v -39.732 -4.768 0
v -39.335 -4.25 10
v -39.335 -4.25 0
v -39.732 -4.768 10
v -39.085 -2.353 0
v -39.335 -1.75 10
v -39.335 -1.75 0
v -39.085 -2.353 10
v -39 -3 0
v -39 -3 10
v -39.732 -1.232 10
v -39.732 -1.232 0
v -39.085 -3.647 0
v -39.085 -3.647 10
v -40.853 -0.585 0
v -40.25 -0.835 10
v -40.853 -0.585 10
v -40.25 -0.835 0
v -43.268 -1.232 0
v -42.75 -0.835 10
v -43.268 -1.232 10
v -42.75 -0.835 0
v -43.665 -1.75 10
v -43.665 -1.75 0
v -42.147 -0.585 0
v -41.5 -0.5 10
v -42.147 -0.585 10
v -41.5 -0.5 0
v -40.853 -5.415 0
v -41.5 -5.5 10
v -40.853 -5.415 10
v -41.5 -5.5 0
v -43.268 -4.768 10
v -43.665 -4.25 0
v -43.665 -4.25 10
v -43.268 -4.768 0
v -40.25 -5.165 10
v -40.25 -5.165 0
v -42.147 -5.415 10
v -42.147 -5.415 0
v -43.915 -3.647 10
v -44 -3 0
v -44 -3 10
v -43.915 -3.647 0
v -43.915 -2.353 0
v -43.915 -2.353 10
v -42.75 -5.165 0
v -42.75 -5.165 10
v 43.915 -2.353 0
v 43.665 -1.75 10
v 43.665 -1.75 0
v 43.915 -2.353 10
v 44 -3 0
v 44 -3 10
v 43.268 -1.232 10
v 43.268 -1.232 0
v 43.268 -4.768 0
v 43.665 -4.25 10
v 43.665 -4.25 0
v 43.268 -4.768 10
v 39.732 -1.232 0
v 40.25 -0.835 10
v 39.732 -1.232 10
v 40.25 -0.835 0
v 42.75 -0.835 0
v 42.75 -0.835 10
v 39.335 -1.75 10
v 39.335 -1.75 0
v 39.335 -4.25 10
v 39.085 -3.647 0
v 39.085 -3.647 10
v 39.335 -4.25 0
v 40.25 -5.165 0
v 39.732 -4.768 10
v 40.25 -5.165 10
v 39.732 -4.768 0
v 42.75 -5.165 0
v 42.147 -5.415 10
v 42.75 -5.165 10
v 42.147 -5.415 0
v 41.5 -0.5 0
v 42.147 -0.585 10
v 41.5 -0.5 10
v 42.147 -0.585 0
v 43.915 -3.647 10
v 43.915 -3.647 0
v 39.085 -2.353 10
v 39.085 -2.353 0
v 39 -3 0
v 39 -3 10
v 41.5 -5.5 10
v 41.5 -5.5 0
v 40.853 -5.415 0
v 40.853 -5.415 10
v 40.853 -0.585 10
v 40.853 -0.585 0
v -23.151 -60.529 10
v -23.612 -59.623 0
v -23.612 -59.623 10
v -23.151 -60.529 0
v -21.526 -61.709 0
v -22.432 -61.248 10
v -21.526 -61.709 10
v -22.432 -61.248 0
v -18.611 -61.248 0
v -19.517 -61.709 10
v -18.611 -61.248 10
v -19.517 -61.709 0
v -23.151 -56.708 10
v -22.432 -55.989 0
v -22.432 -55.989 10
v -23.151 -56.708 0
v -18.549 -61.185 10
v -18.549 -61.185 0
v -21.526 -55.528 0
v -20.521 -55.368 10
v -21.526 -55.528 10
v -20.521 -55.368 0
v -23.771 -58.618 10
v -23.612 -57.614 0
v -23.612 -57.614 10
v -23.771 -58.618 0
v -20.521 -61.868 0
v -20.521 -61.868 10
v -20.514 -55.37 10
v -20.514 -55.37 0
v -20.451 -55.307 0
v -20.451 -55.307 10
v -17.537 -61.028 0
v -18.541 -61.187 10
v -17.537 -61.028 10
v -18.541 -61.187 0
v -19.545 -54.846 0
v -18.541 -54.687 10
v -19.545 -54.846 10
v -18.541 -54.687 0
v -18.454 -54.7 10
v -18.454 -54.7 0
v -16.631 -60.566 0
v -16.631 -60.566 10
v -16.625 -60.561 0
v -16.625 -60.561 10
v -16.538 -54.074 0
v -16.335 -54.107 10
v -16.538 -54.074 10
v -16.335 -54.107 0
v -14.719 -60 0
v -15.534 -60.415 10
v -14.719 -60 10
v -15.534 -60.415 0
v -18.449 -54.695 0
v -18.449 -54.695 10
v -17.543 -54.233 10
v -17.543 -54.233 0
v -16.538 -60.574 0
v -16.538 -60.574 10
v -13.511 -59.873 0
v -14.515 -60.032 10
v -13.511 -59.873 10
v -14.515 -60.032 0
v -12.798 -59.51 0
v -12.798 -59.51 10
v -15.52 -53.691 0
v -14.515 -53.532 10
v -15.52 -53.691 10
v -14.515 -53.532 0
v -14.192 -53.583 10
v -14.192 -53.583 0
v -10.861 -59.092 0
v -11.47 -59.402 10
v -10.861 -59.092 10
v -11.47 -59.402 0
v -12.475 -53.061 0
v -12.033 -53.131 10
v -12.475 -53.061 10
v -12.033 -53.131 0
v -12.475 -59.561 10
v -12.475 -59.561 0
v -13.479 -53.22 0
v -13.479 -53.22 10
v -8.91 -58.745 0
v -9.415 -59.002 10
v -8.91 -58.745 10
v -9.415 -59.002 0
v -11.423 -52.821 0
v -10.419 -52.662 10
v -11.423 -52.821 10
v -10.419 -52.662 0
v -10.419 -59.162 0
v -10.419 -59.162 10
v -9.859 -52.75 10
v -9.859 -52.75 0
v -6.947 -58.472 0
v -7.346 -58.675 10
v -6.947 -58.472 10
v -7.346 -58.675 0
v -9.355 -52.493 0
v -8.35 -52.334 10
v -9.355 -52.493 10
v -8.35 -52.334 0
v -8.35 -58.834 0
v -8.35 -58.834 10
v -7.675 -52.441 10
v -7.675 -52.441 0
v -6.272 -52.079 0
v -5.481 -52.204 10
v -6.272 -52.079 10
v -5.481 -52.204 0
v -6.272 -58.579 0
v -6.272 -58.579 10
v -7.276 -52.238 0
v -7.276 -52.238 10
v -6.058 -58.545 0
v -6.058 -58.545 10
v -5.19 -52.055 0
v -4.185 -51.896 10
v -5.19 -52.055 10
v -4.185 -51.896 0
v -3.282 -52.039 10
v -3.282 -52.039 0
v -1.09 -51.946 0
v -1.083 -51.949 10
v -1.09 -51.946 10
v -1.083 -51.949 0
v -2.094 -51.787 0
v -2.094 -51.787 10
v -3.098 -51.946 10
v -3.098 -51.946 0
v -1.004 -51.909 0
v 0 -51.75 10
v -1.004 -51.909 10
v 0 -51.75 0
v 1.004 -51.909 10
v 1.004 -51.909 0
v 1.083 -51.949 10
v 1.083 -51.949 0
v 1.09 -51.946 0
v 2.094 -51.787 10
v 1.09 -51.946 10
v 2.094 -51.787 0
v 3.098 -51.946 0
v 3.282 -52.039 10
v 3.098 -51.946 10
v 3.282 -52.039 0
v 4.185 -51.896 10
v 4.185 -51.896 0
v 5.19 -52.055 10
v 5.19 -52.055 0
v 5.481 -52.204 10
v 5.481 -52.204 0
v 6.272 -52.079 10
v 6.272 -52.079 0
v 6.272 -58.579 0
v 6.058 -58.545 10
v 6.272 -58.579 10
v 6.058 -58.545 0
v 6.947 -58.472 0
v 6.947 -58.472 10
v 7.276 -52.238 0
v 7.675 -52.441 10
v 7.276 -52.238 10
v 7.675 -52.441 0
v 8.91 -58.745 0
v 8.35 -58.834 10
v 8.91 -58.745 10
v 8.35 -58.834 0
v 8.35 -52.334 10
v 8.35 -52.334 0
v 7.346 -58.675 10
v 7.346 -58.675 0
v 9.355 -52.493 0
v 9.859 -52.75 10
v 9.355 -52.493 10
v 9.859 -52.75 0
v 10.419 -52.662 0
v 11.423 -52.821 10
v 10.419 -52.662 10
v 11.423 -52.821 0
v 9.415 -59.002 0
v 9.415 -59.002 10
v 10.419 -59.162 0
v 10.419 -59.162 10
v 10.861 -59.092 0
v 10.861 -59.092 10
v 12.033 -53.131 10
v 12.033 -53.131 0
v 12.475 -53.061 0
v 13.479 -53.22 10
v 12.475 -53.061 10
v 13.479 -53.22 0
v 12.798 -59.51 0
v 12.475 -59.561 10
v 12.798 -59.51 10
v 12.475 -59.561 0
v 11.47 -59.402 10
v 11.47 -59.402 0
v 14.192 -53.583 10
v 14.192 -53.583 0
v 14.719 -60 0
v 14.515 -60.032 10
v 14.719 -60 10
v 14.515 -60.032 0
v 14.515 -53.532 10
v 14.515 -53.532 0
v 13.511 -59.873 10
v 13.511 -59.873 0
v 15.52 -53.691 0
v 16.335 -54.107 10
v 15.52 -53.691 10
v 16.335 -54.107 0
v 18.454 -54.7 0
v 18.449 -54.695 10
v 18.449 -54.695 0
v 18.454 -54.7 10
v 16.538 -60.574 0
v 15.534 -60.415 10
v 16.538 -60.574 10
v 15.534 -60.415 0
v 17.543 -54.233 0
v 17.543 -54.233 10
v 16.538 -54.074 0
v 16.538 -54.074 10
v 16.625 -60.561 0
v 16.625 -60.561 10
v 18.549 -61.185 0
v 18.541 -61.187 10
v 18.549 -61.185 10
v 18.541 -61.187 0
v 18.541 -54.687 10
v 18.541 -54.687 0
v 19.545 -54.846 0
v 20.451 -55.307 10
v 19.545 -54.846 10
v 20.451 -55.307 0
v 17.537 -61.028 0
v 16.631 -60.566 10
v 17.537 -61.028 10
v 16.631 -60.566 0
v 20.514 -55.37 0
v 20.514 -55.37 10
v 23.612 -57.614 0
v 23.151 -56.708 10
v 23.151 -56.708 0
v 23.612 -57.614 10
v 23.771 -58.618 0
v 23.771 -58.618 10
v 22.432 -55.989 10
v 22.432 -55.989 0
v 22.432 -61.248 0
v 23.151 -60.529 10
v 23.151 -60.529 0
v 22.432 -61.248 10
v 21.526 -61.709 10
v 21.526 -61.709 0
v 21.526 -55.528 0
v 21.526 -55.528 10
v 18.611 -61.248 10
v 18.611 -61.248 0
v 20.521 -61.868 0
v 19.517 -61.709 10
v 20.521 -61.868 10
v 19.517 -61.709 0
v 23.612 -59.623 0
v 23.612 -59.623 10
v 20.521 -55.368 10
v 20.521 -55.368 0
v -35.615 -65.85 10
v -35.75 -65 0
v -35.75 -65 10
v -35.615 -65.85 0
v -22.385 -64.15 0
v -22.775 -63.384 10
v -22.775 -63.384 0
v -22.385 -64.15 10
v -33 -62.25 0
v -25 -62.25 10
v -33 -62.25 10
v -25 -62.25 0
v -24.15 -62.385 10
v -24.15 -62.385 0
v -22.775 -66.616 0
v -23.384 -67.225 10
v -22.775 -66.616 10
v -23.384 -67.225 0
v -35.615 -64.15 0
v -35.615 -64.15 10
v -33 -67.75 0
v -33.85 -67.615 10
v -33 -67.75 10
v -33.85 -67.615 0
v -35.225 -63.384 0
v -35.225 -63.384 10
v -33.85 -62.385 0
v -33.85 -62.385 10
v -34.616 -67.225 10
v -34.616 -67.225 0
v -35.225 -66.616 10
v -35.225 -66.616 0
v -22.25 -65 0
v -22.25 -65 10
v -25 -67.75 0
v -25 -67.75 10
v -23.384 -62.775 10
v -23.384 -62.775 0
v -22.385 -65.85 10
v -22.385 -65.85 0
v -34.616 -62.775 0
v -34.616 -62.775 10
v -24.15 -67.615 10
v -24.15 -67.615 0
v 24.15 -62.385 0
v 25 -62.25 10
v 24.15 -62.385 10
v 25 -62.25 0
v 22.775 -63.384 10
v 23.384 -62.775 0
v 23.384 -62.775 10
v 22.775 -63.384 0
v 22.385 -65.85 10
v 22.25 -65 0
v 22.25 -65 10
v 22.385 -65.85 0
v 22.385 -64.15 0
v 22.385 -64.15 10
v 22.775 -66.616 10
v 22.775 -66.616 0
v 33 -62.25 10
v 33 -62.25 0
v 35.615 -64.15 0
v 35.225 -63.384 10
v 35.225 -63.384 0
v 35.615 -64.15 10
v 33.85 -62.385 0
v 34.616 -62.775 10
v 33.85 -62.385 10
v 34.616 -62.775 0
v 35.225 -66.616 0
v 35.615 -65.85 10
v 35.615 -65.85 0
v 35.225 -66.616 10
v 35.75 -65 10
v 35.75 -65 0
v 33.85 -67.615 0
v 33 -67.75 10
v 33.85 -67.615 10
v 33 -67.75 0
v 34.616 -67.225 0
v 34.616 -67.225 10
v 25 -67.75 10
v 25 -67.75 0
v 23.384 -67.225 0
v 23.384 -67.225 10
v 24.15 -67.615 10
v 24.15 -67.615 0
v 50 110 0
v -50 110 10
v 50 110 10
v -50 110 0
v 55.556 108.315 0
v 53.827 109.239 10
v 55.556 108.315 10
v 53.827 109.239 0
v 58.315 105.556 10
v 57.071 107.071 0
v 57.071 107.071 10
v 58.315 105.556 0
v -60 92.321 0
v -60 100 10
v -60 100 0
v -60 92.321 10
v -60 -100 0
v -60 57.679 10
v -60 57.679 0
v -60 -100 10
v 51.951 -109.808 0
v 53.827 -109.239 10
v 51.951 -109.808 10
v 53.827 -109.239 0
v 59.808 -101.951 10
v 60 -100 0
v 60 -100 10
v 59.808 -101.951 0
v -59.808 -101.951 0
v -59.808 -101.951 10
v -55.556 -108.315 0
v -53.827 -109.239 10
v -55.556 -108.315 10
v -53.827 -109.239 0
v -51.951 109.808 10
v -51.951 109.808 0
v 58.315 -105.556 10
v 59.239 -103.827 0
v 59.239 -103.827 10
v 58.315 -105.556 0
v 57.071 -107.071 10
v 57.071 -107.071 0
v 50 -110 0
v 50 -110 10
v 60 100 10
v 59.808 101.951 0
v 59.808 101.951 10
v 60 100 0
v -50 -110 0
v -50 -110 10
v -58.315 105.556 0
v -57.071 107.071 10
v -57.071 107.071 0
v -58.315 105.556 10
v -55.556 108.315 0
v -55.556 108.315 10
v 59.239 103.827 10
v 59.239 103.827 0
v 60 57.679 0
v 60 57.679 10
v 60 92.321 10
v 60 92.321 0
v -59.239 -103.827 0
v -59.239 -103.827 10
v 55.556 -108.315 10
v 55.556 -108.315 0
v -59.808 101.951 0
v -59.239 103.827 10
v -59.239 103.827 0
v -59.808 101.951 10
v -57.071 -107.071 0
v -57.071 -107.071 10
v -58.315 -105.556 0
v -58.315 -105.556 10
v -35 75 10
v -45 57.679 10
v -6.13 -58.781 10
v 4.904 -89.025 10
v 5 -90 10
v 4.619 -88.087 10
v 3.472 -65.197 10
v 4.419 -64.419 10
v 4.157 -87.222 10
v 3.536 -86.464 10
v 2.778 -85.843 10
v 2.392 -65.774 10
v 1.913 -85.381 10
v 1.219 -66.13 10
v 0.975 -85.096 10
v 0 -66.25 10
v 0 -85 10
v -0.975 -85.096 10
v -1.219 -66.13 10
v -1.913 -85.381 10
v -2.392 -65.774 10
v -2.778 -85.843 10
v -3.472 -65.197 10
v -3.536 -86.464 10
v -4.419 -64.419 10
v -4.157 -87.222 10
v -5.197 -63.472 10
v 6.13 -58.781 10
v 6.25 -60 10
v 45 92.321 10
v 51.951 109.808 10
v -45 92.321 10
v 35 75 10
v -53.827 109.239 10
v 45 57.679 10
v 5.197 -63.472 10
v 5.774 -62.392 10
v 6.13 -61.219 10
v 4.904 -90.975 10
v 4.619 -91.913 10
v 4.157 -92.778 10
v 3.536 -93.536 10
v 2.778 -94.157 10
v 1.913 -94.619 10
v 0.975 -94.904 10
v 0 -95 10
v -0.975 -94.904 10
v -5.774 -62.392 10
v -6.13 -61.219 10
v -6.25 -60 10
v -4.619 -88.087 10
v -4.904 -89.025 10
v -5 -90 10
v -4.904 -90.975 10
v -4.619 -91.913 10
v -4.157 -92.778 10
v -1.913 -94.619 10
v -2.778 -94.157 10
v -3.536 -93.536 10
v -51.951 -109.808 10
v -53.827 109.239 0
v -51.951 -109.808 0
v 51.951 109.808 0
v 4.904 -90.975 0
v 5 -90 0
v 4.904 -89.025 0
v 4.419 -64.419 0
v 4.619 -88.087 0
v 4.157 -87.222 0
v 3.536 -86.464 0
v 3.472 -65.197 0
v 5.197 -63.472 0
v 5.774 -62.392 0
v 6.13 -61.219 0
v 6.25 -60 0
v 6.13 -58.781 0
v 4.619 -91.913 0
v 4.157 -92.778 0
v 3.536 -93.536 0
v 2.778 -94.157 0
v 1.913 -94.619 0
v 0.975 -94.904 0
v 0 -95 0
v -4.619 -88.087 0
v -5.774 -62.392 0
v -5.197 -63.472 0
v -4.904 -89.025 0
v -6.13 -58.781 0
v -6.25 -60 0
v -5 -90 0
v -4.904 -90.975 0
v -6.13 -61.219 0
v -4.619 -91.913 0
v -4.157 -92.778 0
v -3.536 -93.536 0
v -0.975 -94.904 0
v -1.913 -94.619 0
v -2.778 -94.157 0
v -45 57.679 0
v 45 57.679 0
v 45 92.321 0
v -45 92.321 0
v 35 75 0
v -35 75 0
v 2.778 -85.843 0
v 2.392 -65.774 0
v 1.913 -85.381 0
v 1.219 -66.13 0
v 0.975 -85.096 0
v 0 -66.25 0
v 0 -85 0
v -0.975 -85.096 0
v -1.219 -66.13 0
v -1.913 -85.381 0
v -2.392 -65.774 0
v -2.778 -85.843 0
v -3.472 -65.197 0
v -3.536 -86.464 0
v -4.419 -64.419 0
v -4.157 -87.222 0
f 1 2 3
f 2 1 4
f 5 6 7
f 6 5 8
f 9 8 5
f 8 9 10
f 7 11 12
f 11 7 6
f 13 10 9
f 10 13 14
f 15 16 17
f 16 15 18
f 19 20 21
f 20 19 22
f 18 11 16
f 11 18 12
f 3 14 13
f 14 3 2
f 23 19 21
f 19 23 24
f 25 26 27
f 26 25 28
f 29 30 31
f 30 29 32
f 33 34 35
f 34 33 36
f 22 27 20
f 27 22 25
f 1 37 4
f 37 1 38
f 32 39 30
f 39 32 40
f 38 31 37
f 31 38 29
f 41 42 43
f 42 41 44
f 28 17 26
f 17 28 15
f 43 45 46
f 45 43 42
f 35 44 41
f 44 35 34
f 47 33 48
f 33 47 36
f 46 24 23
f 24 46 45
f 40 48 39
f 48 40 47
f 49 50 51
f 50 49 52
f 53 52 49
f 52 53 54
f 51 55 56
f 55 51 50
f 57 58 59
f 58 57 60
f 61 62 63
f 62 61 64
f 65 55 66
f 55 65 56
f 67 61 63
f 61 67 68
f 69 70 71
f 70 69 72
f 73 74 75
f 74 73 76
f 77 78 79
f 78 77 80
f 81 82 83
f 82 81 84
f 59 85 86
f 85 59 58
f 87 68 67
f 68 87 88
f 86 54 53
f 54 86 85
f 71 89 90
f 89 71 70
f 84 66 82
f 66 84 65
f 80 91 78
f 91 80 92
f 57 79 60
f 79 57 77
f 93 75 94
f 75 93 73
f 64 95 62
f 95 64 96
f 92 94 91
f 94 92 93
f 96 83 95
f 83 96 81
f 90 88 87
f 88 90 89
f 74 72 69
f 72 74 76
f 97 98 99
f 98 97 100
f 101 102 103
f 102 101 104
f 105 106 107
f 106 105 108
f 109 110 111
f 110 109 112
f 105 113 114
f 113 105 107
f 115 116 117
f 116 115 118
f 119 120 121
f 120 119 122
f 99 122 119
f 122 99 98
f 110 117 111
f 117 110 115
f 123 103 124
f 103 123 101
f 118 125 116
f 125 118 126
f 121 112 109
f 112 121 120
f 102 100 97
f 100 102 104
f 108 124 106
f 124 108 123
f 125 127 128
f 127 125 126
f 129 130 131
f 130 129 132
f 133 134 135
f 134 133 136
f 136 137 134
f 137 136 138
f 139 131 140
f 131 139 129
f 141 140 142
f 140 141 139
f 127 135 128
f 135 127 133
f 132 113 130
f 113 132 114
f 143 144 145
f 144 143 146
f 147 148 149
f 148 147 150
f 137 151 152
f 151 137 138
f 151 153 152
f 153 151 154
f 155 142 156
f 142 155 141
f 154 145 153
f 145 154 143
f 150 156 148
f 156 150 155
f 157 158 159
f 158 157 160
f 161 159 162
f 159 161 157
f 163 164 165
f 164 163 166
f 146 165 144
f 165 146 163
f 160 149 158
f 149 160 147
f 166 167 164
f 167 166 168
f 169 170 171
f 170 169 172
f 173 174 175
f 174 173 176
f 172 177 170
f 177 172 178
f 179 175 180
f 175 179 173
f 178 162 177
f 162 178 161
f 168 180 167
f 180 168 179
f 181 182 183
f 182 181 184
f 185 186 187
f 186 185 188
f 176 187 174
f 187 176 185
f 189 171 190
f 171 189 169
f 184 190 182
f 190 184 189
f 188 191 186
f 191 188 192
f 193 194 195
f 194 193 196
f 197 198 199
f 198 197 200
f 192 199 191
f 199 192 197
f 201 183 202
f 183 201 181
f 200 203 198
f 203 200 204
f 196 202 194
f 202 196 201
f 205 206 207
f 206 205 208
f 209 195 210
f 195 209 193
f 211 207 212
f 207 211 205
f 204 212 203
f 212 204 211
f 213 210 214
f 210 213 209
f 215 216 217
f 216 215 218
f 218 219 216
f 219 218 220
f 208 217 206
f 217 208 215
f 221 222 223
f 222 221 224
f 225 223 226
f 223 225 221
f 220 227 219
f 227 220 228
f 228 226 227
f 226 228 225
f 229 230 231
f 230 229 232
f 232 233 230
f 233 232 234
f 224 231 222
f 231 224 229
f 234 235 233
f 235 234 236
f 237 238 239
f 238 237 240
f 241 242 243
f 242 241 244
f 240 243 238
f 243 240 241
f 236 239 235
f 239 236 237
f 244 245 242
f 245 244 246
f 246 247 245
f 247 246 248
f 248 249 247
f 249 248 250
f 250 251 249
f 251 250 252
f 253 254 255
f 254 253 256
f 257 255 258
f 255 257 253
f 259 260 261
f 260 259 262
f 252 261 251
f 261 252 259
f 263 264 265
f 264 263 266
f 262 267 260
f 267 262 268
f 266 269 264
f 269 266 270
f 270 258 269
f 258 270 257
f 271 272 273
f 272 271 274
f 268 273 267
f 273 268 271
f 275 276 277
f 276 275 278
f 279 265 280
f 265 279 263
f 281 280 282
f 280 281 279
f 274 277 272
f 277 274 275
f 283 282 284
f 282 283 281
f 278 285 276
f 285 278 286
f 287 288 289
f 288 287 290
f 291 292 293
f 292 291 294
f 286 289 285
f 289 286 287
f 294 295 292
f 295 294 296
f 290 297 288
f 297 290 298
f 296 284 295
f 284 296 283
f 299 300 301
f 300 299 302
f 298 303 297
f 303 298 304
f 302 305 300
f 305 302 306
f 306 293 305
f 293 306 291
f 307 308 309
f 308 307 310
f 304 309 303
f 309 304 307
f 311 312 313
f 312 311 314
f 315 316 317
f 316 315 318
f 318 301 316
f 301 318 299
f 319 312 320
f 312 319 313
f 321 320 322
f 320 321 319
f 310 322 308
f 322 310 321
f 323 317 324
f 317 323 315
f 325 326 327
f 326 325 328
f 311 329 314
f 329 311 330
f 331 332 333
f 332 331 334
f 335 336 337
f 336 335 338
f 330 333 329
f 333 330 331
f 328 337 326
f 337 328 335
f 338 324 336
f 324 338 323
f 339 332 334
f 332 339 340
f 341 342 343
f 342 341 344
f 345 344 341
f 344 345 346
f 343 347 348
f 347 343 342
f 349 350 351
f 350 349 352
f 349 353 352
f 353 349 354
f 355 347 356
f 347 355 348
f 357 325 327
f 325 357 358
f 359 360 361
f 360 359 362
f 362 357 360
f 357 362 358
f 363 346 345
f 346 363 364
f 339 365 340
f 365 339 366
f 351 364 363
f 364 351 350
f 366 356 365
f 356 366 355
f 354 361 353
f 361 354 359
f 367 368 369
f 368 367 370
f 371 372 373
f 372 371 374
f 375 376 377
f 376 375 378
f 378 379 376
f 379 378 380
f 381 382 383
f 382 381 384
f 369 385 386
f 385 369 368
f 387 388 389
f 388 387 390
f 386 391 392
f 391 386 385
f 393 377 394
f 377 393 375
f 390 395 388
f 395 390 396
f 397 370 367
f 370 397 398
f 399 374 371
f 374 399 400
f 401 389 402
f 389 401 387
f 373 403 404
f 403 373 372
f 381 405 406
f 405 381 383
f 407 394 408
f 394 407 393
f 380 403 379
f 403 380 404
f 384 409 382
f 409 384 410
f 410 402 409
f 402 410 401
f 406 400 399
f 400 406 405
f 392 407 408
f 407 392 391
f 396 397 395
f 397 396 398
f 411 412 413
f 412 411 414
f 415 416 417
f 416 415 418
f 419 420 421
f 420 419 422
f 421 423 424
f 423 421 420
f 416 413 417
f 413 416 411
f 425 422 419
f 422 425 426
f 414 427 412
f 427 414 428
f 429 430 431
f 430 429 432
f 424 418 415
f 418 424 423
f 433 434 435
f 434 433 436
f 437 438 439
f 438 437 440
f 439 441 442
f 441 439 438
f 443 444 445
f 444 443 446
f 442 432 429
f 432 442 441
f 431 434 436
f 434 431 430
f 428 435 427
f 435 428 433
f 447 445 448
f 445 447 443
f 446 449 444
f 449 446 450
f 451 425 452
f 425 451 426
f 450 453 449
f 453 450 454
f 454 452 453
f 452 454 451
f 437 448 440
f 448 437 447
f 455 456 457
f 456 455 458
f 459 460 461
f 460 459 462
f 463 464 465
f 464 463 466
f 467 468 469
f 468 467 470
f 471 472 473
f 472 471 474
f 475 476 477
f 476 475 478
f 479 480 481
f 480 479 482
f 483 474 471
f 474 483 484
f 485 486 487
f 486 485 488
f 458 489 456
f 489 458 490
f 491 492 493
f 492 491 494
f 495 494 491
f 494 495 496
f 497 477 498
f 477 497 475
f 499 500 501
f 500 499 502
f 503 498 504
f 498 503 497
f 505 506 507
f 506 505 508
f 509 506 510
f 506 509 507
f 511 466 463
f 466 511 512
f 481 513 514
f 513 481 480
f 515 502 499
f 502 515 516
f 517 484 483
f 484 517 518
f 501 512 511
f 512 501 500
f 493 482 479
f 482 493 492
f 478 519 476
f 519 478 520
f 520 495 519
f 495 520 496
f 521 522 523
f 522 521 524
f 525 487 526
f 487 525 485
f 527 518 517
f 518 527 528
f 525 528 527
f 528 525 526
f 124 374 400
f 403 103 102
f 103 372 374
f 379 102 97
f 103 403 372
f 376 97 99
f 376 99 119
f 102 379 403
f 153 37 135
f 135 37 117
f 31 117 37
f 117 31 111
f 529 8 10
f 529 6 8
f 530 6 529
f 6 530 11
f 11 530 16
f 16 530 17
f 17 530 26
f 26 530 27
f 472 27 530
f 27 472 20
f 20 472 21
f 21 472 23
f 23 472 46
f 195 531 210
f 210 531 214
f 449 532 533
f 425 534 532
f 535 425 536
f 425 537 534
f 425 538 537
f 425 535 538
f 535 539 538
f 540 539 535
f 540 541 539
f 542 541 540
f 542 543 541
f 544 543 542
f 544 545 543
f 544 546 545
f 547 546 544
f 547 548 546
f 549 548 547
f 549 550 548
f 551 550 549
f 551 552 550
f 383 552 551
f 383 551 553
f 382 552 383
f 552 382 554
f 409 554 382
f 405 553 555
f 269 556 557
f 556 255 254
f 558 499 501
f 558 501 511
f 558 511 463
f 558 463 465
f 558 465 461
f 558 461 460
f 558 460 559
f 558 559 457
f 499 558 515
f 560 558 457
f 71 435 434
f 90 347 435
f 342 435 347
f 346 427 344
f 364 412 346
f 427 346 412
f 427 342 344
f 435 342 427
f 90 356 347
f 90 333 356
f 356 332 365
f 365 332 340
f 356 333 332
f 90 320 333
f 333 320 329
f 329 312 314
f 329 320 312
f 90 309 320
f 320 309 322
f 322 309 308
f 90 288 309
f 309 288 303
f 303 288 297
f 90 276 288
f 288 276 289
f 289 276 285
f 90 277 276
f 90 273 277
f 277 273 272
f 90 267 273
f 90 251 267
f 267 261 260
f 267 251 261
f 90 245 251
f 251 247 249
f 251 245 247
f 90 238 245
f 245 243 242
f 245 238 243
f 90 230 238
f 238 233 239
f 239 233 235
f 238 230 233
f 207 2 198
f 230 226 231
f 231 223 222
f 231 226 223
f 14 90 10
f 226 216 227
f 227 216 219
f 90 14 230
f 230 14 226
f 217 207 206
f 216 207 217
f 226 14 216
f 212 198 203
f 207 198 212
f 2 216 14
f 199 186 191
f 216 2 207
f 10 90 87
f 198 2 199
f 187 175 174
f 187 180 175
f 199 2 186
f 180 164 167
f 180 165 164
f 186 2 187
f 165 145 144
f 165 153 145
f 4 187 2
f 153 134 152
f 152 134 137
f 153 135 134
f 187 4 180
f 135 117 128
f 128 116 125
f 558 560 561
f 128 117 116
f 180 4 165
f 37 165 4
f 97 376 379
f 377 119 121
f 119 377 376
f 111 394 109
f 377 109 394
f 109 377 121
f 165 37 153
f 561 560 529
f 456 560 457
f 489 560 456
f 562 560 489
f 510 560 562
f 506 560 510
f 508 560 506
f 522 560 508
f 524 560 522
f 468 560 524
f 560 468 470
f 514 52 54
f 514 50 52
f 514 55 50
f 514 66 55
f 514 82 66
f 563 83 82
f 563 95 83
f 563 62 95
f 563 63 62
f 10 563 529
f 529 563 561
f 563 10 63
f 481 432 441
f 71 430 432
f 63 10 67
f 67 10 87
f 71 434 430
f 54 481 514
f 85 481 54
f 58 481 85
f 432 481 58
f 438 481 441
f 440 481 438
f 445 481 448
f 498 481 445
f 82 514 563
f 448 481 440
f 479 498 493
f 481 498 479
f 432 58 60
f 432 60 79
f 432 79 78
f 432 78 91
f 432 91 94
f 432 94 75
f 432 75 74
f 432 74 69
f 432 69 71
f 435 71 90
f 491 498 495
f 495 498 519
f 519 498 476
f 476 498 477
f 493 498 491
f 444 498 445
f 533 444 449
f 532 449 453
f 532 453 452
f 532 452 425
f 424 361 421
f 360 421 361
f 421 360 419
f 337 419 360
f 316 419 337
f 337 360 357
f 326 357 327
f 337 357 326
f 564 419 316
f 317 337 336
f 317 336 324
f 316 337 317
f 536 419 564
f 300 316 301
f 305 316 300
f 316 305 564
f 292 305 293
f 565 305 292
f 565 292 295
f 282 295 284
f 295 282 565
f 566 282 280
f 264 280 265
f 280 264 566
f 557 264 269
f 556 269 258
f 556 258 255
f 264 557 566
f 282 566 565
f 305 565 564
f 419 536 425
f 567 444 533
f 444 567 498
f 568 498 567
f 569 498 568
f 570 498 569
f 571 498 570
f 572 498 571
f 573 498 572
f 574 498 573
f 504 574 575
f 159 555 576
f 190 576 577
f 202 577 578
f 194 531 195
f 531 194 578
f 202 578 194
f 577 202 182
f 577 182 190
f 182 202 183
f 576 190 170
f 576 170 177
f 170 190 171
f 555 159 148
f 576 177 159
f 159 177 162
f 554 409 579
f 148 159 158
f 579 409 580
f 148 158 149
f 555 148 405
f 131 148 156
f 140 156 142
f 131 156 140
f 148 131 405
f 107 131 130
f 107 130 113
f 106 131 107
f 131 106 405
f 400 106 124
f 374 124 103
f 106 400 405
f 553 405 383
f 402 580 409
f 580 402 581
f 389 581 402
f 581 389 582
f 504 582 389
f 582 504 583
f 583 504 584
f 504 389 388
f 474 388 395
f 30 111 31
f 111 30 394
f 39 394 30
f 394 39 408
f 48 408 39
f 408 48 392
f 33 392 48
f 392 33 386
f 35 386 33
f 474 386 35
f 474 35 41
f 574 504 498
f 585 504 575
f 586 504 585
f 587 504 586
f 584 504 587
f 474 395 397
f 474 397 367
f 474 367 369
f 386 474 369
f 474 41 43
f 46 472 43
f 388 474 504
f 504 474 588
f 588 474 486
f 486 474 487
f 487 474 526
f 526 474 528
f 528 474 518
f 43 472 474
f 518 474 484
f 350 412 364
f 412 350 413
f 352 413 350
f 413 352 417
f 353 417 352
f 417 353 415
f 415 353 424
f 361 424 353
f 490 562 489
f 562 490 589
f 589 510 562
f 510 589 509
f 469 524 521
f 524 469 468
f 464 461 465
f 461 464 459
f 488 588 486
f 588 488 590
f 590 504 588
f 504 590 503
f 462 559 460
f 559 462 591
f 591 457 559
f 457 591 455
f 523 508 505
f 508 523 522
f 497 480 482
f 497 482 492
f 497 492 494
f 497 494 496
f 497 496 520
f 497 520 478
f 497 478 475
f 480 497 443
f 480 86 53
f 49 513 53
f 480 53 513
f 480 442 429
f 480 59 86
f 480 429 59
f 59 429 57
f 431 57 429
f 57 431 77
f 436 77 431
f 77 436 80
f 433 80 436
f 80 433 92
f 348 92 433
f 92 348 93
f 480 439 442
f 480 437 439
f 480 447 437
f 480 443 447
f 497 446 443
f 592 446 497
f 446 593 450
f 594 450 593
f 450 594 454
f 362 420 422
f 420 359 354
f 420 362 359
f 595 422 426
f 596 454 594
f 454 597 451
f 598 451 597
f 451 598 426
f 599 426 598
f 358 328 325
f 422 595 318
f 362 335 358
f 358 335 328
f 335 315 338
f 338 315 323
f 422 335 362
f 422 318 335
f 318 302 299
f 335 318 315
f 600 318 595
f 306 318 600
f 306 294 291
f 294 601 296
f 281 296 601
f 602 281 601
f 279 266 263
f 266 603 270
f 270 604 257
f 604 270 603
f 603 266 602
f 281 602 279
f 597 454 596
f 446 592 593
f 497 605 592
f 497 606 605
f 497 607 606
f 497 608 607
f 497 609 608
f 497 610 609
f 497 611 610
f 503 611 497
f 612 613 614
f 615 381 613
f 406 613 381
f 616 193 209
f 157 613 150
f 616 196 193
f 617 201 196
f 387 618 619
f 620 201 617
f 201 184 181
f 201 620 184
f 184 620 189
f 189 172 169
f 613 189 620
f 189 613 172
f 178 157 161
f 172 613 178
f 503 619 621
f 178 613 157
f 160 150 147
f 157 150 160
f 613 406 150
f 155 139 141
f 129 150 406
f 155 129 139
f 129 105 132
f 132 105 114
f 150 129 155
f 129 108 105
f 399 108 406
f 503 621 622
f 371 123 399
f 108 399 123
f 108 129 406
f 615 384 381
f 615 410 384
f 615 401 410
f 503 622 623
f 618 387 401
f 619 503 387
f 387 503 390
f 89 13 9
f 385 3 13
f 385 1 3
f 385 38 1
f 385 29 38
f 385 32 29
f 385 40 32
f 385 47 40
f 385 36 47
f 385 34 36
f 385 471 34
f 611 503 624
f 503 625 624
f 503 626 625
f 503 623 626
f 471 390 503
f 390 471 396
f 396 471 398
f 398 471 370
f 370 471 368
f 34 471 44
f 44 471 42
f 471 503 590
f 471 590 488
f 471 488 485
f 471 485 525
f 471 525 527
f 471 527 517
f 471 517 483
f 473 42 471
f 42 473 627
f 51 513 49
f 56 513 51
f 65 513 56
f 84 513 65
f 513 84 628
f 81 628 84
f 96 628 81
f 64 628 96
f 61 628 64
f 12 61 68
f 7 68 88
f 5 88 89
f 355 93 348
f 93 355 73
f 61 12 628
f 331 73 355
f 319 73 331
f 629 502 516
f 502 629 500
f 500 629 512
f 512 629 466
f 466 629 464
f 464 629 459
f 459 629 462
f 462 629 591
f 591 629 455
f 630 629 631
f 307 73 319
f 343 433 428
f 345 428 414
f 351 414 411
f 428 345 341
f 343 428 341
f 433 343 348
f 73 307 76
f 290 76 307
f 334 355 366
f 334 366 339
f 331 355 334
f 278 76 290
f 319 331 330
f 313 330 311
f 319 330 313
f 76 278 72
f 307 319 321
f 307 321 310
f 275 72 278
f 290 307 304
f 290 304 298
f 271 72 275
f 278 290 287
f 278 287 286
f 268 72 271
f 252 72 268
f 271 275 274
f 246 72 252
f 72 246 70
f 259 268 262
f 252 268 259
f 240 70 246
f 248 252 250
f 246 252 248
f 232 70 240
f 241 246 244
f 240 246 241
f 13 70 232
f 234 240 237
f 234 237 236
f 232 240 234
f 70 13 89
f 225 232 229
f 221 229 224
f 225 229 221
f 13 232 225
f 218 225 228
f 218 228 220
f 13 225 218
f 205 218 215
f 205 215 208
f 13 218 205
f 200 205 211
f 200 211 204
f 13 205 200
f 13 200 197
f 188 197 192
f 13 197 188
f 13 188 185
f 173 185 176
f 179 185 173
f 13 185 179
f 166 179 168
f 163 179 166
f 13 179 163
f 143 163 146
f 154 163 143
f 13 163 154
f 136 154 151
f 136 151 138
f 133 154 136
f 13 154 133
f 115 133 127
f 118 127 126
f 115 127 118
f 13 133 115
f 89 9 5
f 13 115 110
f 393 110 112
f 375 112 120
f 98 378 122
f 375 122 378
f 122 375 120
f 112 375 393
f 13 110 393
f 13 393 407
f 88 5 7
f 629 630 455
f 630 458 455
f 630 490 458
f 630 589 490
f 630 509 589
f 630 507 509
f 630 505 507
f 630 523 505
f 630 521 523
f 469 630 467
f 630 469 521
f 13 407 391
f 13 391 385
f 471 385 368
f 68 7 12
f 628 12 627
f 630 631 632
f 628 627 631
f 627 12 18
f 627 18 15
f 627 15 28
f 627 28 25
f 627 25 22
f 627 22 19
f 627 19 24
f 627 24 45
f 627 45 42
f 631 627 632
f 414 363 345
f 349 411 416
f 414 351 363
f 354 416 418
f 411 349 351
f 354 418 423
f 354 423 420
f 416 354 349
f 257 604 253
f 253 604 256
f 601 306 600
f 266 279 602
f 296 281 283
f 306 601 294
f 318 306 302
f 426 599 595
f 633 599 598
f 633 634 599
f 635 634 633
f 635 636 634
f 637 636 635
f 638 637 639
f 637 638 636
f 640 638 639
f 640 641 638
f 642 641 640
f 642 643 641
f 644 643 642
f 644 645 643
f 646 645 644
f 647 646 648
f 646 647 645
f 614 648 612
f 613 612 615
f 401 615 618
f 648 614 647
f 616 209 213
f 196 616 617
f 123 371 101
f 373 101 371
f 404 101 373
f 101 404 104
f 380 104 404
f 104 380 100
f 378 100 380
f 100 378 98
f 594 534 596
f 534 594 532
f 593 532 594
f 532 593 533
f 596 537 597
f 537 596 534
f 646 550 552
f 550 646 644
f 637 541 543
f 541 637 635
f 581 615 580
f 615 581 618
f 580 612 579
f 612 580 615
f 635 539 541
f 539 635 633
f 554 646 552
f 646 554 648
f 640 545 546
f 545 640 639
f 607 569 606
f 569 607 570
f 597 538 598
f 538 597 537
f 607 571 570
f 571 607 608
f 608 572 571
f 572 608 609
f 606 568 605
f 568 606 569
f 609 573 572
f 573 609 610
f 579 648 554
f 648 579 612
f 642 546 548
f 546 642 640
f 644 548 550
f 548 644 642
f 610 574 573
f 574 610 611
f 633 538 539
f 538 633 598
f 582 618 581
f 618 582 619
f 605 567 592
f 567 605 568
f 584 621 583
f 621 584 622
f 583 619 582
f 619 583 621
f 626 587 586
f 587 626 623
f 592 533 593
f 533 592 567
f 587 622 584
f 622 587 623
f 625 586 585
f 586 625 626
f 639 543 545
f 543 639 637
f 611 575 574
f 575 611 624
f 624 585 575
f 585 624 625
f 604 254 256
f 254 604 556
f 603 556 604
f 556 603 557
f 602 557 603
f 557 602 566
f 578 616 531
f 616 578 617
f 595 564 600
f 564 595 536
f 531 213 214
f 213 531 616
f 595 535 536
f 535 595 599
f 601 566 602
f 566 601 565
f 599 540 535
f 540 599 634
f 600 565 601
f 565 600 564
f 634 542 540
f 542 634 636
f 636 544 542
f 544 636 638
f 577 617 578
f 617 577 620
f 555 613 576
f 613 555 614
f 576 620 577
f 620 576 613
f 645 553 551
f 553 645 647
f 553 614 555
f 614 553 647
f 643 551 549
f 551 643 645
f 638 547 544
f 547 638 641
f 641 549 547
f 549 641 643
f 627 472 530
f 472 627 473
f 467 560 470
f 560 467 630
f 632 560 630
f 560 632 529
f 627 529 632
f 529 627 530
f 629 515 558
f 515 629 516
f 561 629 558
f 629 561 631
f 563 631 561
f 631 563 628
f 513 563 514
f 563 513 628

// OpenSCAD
// ============================================================
// Harmonic EQ Mount — Polar Axis Spine / Body
// Material: 6061-T6 Aluminium, 10mm thick
// Function: Main structural backbone. RA housing plate bolts
//           to front. Tripod/AZ head bolts to bottom.
//           Altitude adjustment mechanism integrated.
// Author: Neil Manfred | Revision: 1.0 | 2026-06
// ============================================================
//
// DESIGN OVERVIEW:
// The polar axis spine is an L-shaped or wedge-profile plate.
// The RA axis is horizontal, set at the observer's latitude
// by an altitude adjuster (slotted arc).
// This file produces the MAIN BODY — a flat plate with:
//   - RA plate attachment holes (front face, 4× M5)
//   - Tripod attachment holes (bottom, 3/8"-16 threaded insert)
//   - Altitude adjustment arc slot (±20° travel from centre)
//   - Azimuth adjustment slots (±5° travel)
//   - Counterweight shaft boss hole (M12 thread insert, bottom)
// ============================================================

// ---- PARAMETERS ----

SPINE_W    = 120;    // mm — body width
SPINE_H    = 220;    // mm — body height
SPINE_T    = 10;     // mm — thickness

// RA plate attachment (matches RA_FrontPlate.scad corner holes)
// 4× M5 bolts on 166mm × 166mm pattern (190mm plate, 12mm inset each side)
RA_ATTACH_X = 83;   // half-spacing X
RA_ATTACH_Y = 83;   // half-spacing Y
RA_BOLT     = 5.0;  // M5 tapping pilot (4.2mm) or clearance (5.5mm)
// NOTE: Set to 5.0 for clearance; change to 4.2 for tapping if spine is the threaded side

// Altitude arc slot
// Centred at the bottom of the plate; arc allows polar altitude adjustment
ARC_RADIUS  = 60;   // mm — radius of adjustment arc
ARC_ANGLE   = 20;   // ±degrees either side of centre
ARC_WIDTH   = 6.5;  // mm — slot width for M6 bolt

// Tripod mount (bottom — 3/8"-16 UNC insert, or 10mm clearance for bolt)
TRIPOD_BORE = 10.0; // mm — 3/8" UNC = 9.53mm bore; use 10mm for bronze insert
TRIPOD_X    = 0;
TRIPOD_Y    = -SPINE_H/2 + 20;

// Counterweight shaft (Ø12mm through + M12 insert for threaded rod)
CW_BORE     = 12.5;
CW_X        = 0;
CW_Y        = -SPINE_H/2 + 50;

// Corner lightening pockets (optional — saves ~15% material)
POCKET_R    = 20;

// ---- GEOMETRY ----

module polar_spine() {
    difference() {
        // Main body (rounded rect)
        hull() {
            for (x = [-SPINE_W/2 + 10, SPINE_W/2 - 10])
                for (y = [-SPINE_H/2 + 10, SPINE_H/2 - 10])
                    translate([x, y, 0]) cylinder(r=10, h=SPINE_T, $fn=32);
        }

        // ---- RA PLATE ATTACHMENT (4× M5) ----
        for (x = [-RA_ATTACH_X/2, RA_ATTACH_X/2])
            for (y = [SPINE_H/2 - 30, SPINE_H/2 - 30 - RA_ATTACH_Y])
                translate([x, y, -0.5])
                    cylinder(d=RA_BOLT, h=SPINE_T+1, $fn=24);

        // ---- ALTITUDE ADJUSTMENT ARC SLOT ----
        // Slot centred at (0, -ARC_RADIUS) from plate centre
        // Arc sweeps ±ARC_ANGLE degrees
        for (a = [-ARC_ANGLE : 2 : ARC_ANGLE]) {
            translate([
                sin(a) * ARC_RADIUS,
                -SPINE_H/4 + cos(a) * ARC_RADIUS - ARC_RADIUS,
                -0.5
            ])
                cylinder(d=ARC_WIDTH, h=SPINE_T+1, $fn=20);
        }

        // ---- TRIPOD MOUNT (bottom centre) ----
        translate([TRIPOD_X, TRIPOD_Y, -0.5])
            cylinder(d=TRIPOD_BORE, h=SPINE_T+1, $fn=32);

        // ---- COUNTERWEIGHT SHAFT BOSS ----
        translate([CW_X, CW_Y, -0.5])
            cylinder(d=CW_BORE, h=SPINE_T+1, $fn=32);

        // ---- MATERIAL RELIEF POCKETS (2× triangular corners top) ----
        // These reduce material without losing structural stiffness
        translate([-SPINE_W/2 + 5, SPINE_H/2 - 5 - POCKET_R*1.5, -0.5])
            cylinder(r=POCKET_R, h=SPINE_T+1, $fn=6);
        translate([SPINE_W/2 - 5, SPINE_H/2 - 5 - POCKET_R*1.5, -0.5])
            cylinder(r=POCKET_R, h=SPINE_T+1, $fn=6);

        // ---- AZIMUTH ADJUSTMENT SLOTS (2× bottom, horizontal) ----
        // Allows fine AZ trim ±5°
        for (sign = [-1, 1]) {
            translate([sign * 25, TRIPOD_Y + 25, -0.5])
            hull() {
                cylinder(d=5.5, h=SPINE_T+1, $fn=20);
                translate([sign * 8, 0, 0])
                    cylinder(d=5.5, h=SPINE_T+1, $fn=20);
            }
        }
    }
}

polar_spine();
